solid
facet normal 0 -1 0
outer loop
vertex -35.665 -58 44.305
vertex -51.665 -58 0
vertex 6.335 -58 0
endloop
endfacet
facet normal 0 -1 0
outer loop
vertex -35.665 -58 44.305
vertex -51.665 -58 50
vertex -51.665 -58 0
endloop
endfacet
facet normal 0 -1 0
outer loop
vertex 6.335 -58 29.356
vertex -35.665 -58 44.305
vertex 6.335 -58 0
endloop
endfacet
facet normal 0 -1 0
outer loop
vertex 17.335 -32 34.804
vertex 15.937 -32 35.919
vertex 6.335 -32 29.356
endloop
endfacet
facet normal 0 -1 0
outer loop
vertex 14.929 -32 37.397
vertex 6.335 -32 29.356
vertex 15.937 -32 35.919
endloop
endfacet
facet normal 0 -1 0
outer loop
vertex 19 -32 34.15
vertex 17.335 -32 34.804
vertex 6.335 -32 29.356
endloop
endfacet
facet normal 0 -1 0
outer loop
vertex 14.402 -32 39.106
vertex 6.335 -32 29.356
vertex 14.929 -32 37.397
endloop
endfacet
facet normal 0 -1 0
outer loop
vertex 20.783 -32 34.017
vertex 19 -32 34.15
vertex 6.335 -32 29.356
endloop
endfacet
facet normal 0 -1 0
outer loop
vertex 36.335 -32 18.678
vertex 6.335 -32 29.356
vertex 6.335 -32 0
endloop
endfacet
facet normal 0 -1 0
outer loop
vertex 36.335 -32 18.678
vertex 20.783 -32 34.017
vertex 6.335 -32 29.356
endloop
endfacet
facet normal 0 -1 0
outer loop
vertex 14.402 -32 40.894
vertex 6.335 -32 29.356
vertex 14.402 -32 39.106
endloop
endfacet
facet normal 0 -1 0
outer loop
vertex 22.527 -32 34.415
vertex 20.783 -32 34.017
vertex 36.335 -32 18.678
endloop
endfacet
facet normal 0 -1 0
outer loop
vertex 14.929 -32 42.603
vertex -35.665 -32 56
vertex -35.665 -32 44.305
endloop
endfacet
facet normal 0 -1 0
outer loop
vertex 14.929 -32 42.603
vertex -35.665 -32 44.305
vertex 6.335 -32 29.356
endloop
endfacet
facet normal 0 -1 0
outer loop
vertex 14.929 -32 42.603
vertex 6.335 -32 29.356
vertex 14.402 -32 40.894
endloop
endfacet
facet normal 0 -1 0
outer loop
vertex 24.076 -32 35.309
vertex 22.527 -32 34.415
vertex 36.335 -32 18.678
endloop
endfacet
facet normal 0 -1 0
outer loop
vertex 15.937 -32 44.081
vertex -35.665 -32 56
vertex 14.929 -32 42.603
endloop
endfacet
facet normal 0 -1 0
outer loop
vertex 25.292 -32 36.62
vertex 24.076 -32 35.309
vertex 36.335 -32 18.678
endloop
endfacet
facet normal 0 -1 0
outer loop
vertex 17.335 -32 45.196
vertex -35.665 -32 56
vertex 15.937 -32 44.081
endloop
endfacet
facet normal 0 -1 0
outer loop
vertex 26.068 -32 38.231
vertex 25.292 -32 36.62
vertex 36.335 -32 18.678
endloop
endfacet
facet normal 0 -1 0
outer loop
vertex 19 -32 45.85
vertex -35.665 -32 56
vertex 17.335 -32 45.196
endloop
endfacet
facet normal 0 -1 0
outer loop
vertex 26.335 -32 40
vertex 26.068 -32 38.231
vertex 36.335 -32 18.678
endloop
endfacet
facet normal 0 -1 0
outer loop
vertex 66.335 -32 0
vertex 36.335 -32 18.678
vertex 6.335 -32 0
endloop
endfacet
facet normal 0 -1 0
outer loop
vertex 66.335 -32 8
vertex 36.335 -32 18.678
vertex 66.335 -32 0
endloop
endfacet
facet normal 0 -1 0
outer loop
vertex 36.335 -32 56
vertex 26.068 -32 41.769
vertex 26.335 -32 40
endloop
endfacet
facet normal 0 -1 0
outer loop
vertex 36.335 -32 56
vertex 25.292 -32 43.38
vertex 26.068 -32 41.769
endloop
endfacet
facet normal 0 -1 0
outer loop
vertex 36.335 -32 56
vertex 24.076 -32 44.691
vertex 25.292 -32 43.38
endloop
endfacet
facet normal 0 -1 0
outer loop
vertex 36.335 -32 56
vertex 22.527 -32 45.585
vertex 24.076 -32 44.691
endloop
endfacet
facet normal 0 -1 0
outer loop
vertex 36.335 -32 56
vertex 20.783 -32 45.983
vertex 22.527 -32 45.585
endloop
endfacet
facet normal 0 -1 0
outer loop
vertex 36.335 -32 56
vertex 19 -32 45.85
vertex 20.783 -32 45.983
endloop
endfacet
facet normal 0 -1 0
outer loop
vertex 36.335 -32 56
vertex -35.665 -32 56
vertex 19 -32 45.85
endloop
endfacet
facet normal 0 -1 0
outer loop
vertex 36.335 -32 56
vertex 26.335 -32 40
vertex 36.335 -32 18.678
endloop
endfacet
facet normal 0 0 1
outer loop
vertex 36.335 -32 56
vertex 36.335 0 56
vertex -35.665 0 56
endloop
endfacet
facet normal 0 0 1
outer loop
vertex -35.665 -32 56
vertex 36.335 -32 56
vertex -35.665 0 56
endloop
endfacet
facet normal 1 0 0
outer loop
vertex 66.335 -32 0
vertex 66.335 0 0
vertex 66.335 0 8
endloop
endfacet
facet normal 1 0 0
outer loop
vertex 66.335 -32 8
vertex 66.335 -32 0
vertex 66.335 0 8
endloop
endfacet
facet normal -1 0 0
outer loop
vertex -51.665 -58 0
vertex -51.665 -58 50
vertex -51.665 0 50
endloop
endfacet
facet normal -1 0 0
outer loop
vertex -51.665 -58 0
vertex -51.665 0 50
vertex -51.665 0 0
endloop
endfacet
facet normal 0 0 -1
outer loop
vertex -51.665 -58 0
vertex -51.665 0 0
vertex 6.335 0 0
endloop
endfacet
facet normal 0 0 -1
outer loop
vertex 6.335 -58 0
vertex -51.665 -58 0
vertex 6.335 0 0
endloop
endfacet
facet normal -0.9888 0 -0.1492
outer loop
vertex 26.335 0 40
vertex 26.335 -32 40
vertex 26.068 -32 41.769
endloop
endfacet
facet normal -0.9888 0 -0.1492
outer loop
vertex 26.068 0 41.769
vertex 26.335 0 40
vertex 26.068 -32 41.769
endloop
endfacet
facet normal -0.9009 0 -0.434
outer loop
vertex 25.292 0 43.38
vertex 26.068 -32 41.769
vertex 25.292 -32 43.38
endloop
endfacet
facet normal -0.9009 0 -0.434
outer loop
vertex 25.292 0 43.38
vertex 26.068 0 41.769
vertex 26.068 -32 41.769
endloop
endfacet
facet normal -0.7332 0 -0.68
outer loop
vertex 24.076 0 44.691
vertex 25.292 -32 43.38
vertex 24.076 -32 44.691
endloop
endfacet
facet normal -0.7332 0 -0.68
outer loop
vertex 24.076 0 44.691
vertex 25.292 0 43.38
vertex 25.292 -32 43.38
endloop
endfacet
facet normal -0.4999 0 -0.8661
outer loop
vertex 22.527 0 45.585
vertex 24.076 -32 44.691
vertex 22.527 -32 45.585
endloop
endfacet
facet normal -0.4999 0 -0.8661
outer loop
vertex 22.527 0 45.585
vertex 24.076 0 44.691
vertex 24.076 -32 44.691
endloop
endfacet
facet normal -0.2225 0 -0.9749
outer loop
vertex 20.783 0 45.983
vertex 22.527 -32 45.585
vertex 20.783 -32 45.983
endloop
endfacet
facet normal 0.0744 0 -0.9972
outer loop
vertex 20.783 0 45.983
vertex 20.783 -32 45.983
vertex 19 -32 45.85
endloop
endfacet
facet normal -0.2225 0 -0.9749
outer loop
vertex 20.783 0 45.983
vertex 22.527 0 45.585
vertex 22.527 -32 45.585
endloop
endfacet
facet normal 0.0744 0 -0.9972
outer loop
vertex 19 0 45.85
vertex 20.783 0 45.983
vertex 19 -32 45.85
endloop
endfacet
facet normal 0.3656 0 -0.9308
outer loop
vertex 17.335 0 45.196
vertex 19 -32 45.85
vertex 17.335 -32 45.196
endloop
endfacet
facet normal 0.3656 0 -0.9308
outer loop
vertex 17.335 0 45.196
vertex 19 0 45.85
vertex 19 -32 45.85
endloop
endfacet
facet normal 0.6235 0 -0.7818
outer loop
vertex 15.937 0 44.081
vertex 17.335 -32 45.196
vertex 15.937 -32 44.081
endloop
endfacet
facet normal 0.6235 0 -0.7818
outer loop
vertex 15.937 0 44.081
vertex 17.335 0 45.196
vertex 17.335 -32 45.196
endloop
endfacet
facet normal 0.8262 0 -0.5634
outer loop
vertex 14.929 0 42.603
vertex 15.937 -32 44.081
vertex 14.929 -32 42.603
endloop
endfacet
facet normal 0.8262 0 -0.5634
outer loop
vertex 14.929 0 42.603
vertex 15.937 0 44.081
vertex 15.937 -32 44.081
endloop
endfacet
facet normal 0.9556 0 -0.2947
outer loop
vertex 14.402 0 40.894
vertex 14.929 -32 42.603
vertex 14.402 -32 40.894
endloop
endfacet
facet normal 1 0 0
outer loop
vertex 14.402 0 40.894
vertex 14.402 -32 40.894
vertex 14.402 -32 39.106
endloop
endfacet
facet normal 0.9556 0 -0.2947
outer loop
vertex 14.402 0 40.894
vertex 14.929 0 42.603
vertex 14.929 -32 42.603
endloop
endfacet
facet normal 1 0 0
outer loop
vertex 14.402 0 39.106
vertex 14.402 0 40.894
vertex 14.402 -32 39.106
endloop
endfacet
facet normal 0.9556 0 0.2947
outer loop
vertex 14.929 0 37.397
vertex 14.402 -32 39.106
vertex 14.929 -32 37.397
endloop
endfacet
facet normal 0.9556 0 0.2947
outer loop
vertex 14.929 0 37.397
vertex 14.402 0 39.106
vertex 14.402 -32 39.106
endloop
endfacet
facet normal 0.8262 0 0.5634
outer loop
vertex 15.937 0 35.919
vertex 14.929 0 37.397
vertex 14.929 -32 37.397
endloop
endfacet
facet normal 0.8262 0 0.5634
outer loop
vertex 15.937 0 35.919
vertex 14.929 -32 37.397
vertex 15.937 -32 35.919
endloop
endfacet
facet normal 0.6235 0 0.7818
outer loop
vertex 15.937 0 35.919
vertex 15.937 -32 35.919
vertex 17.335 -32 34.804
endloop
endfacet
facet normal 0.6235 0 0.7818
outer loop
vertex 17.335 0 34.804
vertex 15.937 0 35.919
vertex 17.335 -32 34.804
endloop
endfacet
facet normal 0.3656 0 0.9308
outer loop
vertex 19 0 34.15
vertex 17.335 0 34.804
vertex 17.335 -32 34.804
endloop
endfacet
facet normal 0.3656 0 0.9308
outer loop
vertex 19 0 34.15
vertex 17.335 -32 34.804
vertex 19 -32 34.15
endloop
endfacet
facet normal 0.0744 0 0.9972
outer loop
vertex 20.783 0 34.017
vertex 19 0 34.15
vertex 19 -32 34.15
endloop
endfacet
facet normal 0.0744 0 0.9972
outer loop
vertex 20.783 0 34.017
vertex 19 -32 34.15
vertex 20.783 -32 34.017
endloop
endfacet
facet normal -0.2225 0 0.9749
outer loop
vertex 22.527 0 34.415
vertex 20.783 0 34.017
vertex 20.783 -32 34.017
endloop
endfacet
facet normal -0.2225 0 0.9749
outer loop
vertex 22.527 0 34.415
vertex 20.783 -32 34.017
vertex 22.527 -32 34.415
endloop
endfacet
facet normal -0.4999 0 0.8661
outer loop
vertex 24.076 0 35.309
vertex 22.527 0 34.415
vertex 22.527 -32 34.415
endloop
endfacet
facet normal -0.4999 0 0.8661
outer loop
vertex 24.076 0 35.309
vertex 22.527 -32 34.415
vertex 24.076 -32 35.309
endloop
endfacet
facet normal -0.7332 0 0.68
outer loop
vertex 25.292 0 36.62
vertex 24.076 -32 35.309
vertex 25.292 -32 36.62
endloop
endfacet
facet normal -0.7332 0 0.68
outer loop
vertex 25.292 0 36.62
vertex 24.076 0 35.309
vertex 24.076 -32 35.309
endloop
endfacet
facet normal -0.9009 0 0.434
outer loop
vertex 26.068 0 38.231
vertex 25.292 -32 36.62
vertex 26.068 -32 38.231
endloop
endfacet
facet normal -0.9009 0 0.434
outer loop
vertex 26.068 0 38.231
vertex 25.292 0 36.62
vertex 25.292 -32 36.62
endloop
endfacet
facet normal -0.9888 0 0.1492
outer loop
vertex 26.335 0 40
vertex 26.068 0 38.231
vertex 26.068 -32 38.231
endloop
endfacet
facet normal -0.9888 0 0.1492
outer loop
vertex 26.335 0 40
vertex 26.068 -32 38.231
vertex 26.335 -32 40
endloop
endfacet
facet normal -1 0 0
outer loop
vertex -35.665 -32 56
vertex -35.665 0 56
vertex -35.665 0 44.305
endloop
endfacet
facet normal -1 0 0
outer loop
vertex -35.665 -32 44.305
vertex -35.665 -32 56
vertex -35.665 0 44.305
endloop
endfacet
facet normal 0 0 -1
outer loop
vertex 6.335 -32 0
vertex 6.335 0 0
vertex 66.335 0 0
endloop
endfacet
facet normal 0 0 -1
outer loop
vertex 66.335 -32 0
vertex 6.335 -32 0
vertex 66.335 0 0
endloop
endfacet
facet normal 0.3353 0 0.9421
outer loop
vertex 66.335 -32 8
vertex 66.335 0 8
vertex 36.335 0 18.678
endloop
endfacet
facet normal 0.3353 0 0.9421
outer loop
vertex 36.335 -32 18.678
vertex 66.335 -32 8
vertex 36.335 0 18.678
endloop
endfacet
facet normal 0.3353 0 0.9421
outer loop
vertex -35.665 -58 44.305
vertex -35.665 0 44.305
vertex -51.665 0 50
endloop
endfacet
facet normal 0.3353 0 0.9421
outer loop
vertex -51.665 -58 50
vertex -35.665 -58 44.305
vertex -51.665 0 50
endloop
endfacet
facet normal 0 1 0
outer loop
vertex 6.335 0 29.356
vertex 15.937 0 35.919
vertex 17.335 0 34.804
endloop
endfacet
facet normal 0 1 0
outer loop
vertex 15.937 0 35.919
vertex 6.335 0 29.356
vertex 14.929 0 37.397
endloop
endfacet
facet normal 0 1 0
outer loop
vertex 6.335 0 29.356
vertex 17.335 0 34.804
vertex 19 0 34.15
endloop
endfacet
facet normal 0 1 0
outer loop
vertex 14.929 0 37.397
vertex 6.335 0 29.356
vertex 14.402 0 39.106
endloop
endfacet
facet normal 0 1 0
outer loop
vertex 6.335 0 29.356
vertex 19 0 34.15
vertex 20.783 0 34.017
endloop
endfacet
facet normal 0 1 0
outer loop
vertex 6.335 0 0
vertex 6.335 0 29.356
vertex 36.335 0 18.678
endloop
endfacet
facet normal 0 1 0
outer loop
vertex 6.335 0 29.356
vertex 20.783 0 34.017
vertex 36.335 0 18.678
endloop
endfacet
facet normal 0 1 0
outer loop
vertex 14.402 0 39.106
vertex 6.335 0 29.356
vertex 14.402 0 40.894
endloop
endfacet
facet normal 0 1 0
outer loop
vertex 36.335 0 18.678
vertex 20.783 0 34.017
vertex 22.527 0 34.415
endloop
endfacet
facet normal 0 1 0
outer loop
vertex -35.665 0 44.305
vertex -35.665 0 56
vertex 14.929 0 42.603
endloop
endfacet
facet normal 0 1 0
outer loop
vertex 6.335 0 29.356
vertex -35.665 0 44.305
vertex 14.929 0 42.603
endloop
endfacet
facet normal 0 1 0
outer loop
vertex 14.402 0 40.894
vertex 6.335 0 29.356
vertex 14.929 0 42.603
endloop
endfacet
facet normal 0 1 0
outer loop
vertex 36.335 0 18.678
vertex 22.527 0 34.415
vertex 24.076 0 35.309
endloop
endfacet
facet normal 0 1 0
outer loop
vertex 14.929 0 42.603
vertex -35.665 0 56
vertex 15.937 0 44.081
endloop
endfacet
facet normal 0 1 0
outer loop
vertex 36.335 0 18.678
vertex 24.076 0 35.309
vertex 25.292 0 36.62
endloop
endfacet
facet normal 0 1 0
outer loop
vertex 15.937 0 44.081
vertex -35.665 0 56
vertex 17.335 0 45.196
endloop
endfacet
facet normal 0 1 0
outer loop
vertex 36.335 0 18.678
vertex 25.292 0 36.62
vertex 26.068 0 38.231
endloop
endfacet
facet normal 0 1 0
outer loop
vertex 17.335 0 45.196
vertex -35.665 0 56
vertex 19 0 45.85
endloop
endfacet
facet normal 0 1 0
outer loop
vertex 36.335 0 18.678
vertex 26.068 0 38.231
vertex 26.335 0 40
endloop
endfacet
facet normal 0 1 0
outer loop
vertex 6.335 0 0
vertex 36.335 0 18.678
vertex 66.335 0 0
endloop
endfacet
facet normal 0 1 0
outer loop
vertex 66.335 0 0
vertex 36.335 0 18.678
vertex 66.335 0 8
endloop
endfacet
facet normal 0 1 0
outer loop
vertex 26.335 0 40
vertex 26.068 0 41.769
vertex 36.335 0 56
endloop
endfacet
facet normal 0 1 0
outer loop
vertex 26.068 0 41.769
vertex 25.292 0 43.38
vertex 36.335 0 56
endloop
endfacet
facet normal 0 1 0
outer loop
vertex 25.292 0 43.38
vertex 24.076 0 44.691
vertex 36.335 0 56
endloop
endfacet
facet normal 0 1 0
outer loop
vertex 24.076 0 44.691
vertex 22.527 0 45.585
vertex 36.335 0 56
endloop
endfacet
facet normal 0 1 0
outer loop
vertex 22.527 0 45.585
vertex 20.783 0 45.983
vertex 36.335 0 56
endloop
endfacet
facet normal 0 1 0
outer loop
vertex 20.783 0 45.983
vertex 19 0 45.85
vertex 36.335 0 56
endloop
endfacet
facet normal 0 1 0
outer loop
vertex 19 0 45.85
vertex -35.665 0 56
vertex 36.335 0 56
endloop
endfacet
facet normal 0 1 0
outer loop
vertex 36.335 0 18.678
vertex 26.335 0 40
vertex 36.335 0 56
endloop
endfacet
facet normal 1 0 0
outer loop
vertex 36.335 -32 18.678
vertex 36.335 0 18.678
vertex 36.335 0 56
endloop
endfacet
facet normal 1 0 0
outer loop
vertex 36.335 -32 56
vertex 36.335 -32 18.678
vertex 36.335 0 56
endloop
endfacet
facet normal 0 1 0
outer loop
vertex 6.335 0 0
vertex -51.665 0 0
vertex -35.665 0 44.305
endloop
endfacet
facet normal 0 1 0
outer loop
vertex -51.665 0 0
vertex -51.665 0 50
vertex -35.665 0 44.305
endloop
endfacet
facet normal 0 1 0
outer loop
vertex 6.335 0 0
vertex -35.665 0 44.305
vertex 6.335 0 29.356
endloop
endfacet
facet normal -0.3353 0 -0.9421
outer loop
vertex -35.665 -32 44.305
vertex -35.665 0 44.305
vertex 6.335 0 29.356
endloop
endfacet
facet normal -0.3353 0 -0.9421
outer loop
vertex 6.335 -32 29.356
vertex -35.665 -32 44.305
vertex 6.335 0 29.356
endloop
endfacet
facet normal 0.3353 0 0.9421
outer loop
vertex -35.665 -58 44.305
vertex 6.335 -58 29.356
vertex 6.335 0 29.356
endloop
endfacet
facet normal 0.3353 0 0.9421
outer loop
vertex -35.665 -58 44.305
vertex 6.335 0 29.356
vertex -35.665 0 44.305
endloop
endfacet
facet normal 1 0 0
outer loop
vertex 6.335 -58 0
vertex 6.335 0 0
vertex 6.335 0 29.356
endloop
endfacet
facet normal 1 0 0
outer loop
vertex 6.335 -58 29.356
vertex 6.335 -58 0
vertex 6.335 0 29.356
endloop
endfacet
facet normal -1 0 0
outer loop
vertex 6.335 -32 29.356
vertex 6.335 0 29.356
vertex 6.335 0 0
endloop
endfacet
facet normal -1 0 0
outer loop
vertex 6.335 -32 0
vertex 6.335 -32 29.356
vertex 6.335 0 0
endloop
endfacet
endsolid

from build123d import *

# Parameters (mm, degrees)
F1_DEPTH = 58
F0_R     = 6
F2_DEPTH = 32


with BuildPart() as f1:
    # F0 (on Front) → F1 (new body)
    with BuildSketch(Plane.XZ):
        Polygon((-51.664996, 0), (6.335004, 0), (6.335004, 29.355932), (-35.664996, 44.305085), (-51.664996, 50), align=None)
    extrude(amount=F1_DEPTH)


with BuildPart() as f2:
    # F0 (on Front) → F2 (new body)
    with BuildSketch(Plane.XZ):
        Polygon((6.335004, 0), (66.335004, 0), (66.335004, 8), (36.335004, 18.677966), (36.335004, 56), (-35.664996, 56), (-35.664996, 44.305085), (6.335004, 29.355932), align=None)
        with Locations((20.335004, 40)):
            Circle(F0_R, mode=Mode.SUBTRACT)
    extrude(amount=F2_DEPTH)


solid = Compound([f1.part, f2.part])
